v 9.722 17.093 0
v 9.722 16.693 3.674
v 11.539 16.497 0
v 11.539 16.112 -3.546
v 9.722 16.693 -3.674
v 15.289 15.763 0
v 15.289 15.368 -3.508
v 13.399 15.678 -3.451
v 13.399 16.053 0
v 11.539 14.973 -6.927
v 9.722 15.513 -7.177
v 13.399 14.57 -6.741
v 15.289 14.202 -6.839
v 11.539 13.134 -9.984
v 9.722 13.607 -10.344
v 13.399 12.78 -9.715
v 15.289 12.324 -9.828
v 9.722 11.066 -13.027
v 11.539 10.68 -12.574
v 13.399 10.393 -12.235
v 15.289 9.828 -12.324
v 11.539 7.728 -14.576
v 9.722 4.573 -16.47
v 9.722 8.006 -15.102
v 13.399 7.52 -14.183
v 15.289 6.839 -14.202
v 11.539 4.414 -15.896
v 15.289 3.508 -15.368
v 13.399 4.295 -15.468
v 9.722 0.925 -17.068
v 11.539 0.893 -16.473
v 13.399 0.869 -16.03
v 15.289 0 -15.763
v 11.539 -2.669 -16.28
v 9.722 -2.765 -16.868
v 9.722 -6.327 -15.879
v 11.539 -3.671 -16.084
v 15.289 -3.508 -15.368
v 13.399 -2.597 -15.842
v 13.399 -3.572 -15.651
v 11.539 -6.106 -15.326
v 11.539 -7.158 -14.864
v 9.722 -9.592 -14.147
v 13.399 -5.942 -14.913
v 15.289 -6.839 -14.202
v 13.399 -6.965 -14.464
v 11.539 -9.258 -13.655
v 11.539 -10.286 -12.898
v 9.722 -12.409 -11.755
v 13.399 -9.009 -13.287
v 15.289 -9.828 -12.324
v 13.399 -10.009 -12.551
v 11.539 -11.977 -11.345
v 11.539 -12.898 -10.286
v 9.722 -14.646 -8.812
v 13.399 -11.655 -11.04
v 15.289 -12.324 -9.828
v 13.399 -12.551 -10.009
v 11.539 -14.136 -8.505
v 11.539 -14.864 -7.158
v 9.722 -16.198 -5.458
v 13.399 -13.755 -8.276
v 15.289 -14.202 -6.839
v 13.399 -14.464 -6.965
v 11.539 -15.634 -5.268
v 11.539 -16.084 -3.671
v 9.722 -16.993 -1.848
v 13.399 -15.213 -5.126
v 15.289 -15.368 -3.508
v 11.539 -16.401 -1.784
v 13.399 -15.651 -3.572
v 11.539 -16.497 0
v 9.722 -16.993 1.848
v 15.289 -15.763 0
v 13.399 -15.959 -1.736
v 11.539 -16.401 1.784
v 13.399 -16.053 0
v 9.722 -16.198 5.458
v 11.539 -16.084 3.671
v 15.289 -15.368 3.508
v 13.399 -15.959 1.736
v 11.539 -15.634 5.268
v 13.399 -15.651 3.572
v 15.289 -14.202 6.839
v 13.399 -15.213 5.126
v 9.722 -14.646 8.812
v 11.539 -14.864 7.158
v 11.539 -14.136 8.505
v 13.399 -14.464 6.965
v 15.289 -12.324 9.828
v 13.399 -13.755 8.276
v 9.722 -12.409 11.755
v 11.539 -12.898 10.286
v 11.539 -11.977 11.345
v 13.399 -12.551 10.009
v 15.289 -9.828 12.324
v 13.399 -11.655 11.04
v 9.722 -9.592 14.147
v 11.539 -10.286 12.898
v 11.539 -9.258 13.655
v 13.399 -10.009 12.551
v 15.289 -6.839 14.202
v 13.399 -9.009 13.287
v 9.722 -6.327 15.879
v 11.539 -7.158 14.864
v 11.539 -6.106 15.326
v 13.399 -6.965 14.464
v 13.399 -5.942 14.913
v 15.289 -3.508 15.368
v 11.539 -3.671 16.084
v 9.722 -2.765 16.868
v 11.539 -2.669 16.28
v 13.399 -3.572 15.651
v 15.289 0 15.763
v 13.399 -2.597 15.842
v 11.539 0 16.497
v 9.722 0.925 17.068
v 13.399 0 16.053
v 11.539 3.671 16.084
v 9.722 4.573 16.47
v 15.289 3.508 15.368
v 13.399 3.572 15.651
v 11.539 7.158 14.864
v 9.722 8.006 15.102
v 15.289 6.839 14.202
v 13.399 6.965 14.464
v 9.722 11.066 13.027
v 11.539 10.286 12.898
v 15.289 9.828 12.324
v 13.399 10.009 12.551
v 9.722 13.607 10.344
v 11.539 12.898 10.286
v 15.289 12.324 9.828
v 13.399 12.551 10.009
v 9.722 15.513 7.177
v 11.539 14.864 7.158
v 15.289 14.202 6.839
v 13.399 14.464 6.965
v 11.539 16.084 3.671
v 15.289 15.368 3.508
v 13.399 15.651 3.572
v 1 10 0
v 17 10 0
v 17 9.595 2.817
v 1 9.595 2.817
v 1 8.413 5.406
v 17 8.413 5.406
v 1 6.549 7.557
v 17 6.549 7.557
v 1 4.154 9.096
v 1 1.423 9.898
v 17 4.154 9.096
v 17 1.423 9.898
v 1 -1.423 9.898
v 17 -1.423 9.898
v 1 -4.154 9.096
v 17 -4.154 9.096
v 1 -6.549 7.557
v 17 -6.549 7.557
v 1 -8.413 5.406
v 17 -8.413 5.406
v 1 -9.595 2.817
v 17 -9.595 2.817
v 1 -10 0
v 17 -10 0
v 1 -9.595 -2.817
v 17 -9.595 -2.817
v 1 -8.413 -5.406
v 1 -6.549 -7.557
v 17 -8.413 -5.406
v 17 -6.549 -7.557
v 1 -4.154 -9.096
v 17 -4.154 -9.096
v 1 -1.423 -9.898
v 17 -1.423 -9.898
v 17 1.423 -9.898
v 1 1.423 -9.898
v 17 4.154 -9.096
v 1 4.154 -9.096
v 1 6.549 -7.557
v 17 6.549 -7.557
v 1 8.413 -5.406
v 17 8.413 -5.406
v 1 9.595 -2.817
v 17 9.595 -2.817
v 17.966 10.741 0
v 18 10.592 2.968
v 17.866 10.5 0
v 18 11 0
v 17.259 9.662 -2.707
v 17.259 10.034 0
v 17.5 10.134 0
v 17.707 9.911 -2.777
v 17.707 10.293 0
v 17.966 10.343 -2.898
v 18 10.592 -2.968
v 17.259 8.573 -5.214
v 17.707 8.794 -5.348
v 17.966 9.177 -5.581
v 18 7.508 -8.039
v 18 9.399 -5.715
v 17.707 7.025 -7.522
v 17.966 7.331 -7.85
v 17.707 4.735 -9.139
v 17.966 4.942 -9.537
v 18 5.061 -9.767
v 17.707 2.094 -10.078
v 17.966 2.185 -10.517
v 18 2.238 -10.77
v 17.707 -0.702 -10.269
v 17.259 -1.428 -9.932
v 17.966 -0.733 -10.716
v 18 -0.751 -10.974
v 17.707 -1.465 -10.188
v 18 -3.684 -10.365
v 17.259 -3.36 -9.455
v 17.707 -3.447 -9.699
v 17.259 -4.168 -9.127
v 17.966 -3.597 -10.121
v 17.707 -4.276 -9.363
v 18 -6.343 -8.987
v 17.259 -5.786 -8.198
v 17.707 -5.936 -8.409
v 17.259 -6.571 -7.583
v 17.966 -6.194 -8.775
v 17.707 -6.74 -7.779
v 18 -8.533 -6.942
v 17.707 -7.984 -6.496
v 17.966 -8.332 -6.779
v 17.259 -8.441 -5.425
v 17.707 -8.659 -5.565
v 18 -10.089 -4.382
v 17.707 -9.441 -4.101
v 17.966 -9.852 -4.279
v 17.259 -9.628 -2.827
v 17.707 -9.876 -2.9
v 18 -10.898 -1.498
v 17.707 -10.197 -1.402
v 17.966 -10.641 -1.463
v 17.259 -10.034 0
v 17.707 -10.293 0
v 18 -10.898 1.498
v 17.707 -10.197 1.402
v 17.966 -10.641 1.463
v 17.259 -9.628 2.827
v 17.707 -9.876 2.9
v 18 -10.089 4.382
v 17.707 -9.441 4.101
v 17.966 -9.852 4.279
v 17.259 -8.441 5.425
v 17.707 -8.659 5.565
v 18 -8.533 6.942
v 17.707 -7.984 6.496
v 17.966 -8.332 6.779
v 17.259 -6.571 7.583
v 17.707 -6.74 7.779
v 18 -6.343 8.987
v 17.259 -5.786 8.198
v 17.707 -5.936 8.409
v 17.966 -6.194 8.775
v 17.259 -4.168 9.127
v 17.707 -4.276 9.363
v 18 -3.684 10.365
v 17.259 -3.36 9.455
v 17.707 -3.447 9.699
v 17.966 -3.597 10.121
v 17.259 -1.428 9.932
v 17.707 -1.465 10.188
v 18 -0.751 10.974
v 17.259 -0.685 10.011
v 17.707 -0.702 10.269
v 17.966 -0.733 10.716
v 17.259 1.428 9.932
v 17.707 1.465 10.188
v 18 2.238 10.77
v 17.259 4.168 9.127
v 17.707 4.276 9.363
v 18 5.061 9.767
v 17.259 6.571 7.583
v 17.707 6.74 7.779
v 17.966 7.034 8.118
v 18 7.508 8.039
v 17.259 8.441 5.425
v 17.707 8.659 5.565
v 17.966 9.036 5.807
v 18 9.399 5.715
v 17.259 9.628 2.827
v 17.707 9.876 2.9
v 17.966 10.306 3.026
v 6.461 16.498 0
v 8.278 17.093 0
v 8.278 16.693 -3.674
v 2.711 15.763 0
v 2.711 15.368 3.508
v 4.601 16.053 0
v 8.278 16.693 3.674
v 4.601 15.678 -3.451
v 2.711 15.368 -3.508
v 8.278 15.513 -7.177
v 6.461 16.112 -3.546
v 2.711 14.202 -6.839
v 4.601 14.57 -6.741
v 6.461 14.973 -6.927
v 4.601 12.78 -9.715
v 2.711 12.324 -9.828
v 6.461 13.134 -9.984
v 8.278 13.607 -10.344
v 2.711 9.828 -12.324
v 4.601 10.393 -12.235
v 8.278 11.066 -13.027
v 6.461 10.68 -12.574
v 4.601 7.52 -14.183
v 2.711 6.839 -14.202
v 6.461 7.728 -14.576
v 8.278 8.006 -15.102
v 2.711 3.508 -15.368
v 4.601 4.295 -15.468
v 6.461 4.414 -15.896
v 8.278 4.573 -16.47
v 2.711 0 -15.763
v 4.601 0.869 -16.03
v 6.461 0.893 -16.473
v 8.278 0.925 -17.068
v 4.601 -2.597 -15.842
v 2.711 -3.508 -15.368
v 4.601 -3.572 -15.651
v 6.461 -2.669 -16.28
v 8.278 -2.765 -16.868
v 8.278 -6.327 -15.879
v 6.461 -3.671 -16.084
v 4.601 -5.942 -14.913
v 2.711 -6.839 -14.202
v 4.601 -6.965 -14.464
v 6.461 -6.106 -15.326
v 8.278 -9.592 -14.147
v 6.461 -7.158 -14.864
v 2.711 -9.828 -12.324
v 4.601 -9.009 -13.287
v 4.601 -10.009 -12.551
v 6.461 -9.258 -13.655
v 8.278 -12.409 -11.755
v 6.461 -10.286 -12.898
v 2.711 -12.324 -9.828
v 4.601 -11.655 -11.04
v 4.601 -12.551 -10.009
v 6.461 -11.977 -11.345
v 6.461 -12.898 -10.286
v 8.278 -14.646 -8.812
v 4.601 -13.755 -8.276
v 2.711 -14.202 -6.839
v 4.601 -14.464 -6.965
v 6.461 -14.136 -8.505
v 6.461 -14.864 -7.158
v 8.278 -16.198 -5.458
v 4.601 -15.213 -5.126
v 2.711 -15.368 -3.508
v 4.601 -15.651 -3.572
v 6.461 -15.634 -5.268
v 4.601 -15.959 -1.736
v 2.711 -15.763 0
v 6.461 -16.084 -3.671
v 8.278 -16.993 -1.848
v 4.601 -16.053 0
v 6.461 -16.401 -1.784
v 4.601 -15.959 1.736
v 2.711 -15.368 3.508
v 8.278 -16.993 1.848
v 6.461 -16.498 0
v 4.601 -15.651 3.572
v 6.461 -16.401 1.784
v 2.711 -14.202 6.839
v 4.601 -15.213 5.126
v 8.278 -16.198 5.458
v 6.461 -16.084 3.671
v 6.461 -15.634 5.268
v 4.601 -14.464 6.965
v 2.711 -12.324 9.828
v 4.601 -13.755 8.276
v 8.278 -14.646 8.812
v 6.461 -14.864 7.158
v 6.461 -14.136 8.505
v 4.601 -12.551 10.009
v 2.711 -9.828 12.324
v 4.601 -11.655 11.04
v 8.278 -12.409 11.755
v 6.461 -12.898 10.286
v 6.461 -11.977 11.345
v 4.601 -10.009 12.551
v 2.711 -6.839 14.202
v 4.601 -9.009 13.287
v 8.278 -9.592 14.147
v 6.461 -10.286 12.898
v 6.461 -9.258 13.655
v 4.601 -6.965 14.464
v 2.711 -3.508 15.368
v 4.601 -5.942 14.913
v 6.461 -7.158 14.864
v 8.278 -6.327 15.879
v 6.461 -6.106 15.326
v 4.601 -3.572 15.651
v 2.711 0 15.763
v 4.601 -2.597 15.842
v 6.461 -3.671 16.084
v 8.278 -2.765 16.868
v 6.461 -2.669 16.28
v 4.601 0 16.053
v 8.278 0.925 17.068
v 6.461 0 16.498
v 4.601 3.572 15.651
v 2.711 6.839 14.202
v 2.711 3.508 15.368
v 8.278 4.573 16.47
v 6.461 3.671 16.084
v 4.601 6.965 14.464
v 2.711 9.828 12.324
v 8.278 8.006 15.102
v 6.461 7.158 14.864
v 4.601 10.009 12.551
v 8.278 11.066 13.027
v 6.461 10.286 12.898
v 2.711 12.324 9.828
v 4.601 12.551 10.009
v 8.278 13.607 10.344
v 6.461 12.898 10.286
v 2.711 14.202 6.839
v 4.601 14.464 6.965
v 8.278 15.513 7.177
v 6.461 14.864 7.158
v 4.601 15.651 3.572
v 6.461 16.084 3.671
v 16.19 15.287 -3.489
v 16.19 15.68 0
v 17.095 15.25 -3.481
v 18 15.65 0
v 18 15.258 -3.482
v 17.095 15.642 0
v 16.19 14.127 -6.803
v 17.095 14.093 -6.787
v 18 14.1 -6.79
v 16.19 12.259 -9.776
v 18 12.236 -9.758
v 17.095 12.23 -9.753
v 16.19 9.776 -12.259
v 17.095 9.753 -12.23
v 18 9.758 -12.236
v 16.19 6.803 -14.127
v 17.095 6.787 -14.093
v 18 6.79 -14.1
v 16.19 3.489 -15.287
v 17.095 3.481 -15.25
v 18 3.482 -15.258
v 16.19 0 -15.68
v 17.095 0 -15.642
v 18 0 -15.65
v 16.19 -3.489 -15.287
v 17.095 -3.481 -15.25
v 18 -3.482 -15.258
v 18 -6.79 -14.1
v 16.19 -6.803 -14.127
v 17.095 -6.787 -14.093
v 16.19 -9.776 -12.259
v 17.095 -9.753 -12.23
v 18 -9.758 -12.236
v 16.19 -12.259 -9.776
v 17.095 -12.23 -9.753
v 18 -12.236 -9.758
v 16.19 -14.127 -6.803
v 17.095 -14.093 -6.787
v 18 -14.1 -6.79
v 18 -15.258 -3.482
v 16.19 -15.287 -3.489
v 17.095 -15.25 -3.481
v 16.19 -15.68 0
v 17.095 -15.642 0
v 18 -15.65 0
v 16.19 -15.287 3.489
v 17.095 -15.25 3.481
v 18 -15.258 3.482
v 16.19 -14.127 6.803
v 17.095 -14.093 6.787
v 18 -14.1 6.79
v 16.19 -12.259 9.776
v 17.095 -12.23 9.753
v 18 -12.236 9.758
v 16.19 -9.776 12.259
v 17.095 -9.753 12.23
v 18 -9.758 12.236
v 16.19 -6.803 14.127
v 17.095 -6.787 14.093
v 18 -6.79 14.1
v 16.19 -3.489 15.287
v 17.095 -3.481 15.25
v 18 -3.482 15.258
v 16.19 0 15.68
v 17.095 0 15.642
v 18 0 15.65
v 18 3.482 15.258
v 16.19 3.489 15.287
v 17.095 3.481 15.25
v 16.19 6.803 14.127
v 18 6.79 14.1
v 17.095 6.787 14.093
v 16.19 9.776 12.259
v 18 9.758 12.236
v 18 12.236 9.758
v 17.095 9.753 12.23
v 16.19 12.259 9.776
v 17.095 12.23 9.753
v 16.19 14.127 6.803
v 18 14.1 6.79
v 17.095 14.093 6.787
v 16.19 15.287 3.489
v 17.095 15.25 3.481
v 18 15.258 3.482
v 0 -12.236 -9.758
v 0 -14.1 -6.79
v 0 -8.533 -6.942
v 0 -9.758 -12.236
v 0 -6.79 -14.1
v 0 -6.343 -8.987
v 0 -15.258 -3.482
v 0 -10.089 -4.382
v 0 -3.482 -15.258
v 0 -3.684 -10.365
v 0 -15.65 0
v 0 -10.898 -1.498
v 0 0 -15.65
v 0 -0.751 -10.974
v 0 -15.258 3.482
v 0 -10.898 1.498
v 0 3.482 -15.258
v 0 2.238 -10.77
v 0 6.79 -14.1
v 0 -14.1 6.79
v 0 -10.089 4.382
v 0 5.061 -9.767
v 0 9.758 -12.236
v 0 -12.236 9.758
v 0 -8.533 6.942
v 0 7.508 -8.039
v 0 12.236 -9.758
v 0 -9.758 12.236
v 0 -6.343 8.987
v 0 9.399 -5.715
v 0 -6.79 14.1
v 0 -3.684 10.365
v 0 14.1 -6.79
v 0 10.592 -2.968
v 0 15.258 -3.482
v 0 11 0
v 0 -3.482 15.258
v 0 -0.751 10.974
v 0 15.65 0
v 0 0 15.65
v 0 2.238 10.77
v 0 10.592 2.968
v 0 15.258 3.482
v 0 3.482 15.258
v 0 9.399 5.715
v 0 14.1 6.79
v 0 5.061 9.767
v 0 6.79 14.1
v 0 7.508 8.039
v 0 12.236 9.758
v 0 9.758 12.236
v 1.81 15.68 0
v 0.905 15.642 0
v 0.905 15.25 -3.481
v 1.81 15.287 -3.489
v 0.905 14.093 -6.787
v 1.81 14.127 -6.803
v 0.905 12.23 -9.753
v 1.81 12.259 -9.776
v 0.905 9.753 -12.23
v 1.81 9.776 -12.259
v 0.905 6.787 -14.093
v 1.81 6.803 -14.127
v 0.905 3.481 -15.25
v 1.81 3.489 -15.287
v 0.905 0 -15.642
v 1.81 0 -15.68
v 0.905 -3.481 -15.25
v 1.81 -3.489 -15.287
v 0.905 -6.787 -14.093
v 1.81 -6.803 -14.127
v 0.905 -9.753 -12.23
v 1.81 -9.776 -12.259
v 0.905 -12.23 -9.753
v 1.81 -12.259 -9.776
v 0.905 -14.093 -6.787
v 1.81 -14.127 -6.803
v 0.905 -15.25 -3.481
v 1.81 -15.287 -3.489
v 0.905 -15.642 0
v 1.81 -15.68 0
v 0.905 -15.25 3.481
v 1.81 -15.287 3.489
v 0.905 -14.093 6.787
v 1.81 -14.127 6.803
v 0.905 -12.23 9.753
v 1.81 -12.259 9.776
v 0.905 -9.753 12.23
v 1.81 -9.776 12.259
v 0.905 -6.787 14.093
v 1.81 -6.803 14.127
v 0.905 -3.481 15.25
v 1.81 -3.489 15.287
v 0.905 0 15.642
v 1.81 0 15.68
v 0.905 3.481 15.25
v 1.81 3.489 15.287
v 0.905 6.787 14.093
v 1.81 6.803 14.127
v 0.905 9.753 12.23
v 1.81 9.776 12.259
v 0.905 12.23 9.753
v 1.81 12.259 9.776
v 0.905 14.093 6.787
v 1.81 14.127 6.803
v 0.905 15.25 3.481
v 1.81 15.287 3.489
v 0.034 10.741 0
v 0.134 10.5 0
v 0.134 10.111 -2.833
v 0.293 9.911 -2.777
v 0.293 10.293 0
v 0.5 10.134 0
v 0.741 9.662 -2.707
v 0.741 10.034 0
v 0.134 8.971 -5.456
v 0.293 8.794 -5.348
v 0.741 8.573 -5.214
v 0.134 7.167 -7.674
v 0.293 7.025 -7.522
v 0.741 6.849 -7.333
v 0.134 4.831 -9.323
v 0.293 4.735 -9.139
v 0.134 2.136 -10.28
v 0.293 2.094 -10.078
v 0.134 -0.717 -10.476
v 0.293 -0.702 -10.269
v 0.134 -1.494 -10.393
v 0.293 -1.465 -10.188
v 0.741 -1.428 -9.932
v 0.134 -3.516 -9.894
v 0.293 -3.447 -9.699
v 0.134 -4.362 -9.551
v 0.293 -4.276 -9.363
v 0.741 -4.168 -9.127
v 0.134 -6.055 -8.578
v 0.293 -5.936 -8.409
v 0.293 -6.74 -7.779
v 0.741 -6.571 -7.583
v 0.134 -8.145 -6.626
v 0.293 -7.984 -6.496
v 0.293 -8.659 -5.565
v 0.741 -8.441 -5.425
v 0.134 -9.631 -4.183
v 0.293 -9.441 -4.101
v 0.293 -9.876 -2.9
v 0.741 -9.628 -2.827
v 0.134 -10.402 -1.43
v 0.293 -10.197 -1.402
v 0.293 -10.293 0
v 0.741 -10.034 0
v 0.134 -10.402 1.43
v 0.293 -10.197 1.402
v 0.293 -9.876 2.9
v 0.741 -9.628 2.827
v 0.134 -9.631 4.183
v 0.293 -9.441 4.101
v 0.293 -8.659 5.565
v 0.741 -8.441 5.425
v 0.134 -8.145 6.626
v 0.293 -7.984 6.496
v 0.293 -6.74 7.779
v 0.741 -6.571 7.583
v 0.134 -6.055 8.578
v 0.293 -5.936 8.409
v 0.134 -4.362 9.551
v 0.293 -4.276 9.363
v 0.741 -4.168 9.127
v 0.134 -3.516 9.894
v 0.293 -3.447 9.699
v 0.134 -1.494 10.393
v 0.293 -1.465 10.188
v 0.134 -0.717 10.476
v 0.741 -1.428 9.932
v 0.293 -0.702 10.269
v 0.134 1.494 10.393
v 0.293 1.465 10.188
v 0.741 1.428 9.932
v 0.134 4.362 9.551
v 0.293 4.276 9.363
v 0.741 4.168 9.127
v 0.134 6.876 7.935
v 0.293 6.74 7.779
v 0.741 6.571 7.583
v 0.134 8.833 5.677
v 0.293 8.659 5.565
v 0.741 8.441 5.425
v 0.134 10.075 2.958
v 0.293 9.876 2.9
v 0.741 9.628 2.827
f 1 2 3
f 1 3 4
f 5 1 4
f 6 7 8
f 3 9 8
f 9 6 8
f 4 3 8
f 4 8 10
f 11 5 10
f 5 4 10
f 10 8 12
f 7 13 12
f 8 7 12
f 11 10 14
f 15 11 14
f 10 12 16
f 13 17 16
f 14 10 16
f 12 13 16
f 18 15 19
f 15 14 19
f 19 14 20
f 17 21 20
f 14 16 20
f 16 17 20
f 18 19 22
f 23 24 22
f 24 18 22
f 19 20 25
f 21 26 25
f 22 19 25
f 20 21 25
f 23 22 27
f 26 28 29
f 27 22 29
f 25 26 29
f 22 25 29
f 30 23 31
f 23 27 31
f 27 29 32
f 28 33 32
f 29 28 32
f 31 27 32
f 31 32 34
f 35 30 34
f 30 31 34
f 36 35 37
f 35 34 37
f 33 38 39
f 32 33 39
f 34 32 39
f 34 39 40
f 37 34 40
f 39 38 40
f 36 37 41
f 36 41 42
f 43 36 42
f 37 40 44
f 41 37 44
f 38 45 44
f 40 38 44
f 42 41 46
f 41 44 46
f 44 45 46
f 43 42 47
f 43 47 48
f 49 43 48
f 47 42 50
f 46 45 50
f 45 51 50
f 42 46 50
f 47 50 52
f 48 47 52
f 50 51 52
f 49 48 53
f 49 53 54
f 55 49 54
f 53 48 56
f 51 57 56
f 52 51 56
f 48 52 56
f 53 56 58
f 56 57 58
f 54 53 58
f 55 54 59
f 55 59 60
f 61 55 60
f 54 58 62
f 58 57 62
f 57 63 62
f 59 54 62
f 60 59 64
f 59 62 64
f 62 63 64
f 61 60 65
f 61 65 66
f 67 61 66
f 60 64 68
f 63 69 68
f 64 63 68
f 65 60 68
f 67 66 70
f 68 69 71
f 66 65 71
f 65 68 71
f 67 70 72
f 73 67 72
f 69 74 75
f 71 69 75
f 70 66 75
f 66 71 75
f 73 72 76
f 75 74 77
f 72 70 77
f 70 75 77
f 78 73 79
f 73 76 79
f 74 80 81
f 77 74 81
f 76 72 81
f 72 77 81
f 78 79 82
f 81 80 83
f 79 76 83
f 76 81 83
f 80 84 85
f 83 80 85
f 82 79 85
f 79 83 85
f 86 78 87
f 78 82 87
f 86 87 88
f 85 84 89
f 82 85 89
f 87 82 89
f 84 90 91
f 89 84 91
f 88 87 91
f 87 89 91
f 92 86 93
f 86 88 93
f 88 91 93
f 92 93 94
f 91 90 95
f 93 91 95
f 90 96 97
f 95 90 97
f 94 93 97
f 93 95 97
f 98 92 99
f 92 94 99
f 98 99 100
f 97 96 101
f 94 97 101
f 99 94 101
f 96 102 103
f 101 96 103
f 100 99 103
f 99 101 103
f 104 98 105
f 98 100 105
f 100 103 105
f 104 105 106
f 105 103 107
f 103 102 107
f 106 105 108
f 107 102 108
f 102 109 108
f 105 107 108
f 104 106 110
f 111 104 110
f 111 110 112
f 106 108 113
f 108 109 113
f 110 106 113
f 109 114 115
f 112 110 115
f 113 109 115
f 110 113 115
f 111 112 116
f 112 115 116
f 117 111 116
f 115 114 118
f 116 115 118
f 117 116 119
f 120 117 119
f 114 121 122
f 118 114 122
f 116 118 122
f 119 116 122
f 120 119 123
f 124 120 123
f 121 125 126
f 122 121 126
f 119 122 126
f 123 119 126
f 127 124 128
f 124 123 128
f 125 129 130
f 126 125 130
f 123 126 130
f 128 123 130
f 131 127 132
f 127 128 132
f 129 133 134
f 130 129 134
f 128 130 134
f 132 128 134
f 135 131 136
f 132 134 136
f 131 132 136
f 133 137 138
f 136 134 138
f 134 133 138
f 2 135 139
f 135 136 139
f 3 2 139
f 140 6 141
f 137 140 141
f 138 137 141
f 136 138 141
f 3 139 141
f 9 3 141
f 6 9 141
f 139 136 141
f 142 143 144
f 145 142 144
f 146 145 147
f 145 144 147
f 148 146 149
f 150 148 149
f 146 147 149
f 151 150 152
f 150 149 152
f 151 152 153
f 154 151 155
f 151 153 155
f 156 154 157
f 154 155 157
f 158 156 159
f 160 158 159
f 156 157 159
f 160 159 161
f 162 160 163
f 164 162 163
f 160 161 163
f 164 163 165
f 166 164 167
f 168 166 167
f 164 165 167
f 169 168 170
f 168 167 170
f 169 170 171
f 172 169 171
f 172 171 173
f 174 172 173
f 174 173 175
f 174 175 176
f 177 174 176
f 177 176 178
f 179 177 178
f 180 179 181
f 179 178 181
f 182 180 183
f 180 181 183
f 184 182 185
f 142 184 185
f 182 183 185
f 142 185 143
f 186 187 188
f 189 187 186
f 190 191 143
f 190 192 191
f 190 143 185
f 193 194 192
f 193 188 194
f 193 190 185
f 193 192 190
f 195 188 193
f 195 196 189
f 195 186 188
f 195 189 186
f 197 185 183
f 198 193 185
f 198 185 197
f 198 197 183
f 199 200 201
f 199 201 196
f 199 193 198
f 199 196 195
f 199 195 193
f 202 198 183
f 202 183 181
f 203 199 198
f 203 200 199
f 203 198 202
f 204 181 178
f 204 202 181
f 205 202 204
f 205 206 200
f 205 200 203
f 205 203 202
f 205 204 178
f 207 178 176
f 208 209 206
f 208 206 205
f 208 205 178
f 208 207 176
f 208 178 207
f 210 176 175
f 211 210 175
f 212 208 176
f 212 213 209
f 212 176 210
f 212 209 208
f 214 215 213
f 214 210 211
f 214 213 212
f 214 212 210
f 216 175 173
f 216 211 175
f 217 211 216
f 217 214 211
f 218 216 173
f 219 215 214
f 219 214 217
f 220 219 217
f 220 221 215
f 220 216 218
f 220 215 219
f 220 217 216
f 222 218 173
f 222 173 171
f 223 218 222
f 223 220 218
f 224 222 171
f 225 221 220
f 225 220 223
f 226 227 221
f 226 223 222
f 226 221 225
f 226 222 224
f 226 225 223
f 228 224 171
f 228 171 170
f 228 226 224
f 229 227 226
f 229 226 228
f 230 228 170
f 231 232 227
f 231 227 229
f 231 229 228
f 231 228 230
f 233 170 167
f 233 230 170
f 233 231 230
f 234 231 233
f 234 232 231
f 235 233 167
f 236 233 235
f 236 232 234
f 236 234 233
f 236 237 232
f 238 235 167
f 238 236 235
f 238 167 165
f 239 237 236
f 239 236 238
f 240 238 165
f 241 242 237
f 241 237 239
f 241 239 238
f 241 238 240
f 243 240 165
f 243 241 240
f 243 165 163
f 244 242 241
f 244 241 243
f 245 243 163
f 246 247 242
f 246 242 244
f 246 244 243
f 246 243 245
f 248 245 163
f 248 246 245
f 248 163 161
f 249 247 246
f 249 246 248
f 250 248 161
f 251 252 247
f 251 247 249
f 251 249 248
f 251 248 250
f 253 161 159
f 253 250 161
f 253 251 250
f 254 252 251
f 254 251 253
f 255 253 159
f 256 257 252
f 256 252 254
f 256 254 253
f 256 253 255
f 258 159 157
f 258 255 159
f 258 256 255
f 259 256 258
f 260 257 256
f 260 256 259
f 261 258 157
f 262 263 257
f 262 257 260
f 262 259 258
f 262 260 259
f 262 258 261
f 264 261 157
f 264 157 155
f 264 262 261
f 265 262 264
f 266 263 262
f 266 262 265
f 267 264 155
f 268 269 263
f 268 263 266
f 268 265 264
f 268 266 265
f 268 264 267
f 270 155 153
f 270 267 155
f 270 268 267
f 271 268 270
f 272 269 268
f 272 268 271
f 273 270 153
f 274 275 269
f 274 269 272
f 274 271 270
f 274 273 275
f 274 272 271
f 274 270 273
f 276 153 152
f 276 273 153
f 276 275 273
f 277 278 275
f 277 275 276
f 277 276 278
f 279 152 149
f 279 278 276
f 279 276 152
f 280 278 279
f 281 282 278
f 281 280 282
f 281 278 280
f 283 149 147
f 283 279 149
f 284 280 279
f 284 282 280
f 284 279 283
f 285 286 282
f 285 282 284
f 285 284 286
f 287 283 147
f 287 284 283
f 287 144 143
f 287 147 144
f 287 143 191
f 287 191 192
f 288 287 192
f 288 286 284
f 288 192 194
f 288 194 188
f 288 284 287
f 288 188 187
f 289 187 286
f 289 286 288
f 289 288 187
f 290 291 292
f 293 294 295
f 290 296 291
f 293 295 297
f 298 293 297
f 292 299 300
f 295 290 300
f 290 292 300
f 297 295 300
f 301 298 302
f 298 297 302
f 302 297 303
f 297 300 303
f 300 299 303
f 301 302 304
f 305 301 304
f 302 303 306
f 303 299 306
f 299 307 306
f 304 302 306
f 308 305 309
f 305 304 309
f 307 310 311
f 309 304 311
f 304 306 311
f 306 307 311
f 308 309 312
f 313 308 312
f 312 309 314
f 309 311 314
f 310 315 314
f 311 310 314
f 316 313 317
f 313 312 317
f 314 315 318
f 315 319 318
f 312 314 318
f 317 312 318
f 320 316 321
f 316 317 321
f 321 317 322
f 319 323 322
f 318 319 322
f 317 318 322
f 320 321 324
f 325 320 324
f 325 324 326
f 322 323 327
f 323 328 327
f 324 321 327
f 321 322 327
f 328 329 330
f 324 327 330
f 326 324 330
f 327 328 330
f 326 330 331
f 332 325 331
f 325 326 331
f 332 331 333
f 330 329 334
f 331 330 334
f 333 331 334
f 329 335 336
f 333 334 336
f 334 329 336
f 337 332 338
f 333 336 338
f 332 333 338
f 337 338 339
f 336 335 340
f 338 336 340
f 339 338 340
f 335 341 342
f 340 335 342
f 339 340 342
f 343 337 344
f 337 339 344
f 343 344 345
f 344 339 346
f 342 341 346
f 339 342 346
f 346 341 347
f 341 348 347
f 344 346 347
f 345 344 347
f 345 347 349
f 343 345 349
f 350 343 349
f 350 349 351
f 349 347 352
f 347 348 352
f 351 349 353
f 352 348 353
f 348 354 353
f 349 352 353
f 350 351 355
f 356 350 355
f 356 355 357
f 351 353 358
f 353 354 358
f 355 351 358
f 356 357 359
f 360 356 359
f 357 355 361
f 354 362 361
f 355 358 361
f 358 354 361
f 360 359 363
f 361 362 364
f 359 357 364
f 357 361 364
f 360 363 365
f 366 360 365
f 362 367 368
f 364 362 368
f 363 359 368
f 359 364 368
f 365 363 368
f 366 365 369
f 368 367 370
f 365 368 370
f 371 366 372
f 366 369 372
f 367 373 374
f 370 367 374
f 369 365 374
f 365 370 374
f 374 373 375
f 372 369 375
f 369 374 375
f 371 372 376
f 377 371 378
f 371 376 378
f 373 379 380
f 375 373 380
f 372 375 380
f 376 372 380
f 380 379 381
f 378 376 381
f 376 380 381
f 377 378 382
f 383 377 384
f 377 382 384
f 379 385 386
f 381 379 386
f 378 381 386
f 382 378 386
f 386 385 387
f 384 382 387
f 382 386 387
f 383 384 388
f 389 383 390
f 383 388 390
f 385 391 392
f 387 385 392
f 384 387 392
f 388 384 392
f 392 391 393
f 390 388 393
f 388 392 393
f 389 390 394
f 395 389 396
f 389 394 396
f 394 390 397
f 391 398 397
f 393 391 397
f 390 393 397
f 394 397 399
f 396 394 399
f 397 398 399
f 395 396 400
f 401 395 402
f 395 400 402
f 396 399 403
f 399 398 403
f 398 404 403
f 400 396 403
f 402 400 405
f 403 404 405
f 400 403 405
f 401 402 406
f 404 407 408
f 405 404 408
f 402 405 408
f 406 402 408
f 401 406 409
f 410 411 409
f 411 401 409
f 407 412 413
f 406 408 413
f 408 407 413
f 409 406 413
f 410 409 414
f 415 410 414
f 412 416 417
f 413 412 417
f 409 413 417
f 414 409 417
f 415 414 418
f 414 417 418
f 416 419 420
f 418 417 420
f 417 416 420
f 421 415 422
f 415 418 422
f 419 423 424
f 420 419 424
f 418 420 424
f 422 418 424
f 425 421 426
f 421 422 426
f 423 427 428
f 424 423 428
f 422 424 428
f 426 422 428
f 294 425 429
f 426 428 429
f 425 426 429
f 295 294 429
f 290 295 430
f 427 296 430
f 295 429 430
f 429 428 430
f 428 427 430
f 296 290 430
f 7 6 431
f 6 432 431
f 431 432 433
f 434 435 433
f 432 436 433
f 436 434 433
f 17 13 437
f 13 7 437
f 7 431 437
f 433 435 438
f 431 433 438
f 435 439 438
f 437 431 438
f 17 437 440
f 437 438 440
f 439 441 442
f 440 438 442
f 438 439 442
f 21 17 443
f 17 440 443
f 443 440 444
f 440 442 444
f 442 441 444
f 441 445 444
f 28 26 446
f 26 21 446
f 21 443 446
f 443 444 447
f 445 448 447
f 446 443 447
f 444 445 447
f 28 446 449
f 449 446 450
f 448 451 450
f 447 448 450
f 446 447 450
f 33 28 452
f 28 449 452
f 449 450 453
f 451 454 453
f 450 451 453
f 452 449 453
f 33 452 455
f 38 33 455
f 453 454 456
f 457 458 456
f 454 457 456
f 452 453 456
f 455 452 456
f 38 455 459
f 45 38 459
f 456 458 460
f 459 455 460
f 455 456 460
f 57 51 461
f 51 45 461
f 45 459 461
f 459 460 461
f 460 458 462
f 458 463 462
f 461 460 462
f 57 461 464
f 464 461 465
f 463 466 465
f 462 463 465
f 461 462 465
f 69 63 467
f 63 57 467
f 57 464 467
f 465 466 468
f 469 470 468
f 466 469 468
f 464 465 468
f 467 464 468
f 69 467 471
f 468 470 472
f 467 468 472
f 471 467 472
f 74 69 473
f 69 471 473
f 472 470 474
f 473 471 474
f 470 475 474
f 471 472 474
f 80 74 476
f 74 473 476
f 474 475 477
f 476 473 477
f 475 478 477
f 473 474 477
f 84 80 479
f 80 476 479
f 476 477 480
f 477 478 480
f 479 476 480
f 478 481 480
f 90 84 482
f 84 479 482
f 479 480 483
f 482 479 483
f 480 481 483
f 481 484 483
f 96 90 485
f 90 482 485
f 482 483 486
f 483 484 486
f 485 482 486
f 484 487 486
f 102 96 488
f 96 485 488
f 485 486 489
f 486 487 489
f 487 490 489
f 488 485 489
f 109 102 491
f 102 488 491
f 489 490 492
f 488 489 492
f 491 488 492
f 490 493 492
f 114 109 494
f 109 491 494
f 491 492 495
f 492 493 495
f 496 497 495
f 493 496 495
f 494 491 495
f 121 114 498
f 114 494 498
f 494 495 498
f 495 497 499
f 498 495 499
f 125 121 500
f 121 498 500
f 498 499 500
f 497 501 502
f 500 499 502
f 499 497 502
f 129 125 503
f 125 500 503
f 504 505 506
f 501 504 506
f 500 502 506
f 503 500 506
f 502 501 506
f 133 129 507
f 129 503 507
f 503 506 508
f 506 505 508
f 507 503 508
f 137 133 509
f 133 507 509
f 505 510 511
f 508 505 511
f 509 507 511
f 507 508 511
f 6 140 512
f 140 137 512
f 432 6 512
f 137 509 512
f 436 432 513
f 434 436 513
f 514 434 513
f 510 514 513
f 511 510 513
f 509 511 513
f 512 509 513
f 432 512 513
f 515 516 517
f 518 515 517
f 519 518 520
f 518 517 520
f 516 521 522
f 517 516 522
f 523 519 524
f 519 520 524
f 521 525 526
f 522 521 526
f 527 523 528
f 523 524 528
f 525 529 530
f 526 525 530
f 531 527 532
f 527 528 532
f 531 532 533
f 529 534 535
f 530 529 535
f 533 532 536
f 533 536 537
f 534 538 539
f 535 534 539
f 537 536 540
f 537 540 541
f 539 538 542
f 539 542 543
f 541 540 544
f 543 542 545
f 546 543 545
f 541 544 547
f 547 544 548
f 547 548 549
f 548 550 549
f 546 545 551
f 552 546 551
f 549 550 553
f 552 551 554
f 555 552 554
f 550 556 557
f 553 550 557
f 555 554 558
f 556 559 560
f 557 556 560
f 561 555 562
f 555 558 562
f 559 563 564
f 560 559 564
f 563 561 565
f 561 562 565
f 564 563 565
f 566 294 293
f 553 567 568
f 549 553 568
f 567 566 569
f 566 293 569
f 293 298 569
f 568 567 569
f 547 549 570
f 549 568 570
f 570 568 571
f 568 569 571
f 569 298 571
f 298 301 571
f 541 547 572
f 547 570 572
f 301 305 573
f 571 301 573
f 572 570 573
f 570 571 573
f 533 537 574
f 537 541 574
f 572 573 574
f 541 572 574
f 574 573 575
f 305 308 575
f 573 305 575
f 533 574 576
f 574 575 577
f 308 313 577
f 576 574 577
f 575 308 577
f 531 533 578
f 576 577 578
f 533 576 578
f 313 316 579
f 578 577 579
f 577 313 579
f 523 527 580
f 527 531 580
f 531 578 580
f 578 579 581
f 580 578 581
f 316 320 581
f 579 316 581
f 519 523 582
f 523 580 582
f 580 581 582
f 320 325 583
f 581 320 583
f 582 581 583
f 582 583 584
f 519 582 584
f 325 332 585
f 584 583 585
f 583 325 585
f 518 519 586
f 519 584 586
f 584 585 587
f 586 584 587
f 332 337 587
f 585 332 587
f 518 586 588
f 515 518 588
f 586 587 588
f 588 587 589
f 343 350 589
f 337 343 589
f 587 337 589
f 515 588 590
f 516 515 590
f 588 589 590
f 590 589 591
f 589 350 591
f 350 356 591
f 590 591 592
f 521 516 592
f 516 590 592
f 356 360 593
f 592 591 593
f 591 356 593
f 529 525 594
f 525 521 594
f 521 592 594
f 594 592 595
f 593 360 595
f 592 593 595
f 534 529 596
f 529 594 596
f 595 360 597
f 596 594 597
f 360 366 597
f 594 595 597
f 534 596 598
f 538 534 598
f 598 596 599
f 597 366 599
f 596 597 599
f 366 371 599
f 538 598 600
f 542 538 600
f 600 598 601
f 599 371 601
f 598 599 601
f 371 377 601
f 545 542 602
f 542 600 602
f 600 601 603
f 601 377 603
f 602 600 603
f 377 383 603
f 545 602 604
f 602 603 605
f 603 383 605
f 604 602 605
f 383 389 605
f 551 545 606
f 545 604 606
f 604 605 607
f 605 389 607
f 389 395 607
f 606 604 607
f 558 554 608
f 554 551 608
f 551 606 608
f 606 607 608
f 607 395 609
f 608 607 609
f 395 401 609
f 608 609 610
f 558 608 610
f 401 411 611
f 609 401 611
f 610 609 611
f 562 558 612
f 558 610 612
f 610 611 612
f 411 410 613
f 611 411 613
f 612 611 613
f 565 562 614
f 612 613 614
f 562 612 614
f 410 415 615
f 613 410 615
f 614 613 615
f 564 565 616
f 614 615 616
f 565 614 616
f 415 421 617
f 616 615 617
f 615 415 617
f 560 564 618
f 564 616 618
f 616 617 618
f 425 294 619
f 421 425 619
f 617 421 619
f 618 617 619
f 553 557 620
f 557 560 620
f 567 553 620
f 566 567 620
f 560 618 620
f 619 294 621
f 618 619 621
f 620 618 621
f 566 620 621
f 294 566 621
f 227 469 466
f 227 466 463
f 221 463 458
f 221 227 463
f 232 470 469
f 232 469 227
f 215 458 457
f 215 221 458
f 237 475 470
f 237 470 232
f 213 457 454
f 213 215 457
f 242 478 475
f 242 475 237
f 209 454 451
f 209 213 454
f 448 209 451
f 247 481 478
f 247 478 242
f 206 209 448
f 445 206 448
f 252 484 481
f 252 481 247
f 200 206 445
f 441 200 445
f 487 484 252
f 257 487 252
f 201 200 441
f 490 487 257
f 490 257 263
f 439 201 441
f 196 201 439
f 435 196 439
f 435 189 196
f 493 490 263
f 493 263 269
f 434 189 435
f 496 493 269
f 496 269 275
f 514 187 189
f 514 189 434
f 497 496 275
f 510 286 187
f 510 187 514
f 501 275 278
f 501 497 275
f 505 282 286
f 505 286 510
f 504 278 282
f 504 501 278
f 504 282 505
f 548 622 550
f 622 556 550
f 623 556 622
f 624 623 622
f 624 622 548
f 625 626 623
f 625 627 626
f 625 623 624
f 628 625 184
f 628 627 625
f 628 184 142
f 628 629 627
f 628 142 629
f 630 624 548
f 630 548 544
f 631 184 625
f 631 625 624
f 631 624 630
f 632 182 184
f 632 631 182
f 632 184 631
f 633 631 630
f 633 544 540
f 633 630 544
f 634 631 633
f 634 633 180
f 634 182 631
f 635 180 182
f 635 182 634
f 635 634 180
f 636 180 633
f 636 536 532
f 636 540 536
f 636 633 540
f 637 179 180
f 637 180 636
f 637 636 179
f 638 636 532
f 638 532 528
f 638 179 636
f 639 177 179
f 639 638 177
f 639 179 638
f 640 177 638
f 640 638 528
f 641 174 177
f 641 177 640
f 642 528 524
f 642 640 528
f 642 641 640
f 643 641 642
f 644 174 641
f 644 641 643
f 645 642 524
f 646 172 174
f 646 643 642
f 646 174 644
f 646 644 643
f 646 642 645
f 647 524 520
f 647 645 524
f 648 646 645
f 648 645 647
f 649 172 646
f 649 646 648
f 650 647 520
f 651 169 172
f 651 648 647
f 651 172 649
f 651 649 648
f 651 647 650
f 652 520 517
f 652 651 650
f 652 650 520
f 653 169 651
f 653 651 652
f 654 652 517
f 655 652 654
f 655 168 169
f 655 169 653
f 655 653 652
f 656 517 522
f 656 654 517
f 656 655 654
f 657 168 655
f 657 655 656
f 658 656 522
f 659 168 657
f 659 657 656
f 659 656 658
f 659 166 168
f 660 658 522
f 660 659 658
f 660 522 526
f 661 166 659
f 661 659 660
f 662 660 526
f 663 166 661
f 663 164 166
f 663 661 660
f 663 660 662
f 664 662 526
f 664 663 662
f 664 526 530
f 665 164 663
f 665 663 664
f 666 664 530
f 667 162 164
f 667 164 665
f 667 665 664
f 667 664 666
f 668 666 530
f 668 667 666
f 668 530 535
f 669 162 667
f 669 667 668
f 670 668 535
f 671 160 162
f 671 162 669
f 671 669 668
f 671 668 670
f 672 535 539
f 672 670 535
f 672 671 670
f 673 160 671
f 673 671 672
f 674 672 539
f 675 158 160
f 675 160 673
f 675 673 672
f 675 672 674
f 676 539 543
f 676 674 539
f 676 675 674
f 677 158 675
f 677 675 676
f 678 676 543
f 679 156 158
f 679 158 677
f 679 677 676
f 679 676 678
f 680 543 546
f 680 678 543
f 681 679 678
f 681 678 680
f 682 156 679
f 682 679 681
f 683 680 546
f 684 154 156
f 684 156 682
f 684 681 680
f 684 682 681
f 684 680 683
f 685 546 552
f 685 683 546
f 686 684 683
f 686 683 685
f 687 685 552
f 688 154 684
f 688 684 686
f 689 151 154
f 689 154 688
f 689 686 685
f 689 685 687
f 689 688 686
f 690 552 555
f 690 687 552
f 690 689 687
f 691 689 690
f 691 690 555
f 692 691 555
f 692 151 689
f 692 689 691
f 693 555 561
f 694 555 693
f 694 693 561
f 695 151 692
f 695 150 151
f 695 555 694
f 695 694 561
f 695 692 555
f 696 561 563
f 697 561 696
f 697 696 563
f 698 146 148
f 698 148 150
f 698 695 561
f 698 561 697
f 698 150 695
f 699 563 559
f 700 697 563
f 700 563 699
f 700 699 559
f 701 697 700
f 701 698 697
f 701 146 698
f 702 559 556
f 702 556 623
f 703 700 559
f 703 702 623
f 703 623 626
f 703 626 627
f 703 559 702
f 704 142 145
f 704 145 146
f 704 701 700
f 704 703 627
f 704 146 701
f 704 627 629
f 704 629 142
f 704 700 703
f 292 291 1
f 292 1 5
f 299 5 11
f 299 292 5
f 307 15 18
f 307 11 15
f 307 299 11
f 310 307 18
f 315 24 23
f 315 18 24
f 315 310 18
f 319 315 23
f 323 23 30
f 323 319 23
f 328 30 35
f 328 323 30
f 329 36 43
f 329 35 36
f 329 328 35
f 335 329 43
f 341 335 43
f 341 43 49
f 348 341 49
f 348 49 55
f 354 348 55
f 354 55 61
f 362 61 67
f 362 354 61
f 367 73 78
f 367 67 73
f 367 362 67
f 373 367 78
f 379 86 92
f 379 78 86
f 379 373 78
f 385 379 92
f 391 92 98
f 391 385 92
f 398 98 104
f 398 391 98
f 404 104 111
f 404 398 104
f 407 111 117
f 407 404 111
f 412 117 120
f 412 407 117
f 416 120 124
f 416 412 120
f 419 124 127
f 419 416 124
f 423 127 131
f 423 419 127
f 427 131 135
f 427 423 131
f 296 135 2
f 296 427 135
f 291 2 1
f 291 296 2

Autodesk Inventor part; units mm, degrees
sketch "Sketch_1" plane through (0, 0, 0) normal (0, 0, 1) x (1, 0, 0)
  line L0 (18, 0) -> (-18, 0)
  arc A0 (0, 11) -> (1, 10) centre (1, 11) ccw
  line L1 (1, 10) -> (17, 10)
  arc A1 (17, 10) -> (18, 11) centre (17, 11) ccw
  line L2 (18, 11) -> (18, 15.65)
  arc A2 (15.289, 15.7632) -> (18, 15.65) centre (17.3933, 33.6398) ccw
  arc A3 (9.7224, 17.0927) -> (15.289, 15.7632) centre (17.8763, 38.9136) ccw
  line L3 (9.7224, 17.0927) -> (8.2776, 17.0927)
  arc A4 (2.711, 15.7632) -> (8.2776, 17.0927) centre (0.1237, 38.9136) ccw
  arc A5 (0, 15.65) -> (2.711, 15.7632) centre (0.6067, 33.6398) ccw
  line L4 (0, 15.65) -> (0, 11)
revolve "Revolution1" add sketch "Sketch_1" angle 360 about axis through (18, 0, 0) along (1, 0, 0)
ref_plane "NO_GEO_XY" through (0, 0, 0) normal (1, 0, 0) x (0, 0, -1)
ref_plane "NO_GEO_YZ" through (0, 0, 0) normal (0, 0, -1) x (0, 1, 0)
ref_plane "NO_GEO_ZX" through (0, 0, 0) normal (0, 1, 0) x (1, 0, 0)
ref_plane "ir_XY" through (0, 0, 0) normal (0, 0, 1) x (1, 0, 0)
ref_plane "ir_YZ" through (0, 0, 0) normal (1, 0, 0) x (0, 1, 0)
ref_plane "ir_ZX" through (0, 0, 0) normal (0, 1, 0) x (0, 0, 1)
properties part number "22205/20 E_ir"
